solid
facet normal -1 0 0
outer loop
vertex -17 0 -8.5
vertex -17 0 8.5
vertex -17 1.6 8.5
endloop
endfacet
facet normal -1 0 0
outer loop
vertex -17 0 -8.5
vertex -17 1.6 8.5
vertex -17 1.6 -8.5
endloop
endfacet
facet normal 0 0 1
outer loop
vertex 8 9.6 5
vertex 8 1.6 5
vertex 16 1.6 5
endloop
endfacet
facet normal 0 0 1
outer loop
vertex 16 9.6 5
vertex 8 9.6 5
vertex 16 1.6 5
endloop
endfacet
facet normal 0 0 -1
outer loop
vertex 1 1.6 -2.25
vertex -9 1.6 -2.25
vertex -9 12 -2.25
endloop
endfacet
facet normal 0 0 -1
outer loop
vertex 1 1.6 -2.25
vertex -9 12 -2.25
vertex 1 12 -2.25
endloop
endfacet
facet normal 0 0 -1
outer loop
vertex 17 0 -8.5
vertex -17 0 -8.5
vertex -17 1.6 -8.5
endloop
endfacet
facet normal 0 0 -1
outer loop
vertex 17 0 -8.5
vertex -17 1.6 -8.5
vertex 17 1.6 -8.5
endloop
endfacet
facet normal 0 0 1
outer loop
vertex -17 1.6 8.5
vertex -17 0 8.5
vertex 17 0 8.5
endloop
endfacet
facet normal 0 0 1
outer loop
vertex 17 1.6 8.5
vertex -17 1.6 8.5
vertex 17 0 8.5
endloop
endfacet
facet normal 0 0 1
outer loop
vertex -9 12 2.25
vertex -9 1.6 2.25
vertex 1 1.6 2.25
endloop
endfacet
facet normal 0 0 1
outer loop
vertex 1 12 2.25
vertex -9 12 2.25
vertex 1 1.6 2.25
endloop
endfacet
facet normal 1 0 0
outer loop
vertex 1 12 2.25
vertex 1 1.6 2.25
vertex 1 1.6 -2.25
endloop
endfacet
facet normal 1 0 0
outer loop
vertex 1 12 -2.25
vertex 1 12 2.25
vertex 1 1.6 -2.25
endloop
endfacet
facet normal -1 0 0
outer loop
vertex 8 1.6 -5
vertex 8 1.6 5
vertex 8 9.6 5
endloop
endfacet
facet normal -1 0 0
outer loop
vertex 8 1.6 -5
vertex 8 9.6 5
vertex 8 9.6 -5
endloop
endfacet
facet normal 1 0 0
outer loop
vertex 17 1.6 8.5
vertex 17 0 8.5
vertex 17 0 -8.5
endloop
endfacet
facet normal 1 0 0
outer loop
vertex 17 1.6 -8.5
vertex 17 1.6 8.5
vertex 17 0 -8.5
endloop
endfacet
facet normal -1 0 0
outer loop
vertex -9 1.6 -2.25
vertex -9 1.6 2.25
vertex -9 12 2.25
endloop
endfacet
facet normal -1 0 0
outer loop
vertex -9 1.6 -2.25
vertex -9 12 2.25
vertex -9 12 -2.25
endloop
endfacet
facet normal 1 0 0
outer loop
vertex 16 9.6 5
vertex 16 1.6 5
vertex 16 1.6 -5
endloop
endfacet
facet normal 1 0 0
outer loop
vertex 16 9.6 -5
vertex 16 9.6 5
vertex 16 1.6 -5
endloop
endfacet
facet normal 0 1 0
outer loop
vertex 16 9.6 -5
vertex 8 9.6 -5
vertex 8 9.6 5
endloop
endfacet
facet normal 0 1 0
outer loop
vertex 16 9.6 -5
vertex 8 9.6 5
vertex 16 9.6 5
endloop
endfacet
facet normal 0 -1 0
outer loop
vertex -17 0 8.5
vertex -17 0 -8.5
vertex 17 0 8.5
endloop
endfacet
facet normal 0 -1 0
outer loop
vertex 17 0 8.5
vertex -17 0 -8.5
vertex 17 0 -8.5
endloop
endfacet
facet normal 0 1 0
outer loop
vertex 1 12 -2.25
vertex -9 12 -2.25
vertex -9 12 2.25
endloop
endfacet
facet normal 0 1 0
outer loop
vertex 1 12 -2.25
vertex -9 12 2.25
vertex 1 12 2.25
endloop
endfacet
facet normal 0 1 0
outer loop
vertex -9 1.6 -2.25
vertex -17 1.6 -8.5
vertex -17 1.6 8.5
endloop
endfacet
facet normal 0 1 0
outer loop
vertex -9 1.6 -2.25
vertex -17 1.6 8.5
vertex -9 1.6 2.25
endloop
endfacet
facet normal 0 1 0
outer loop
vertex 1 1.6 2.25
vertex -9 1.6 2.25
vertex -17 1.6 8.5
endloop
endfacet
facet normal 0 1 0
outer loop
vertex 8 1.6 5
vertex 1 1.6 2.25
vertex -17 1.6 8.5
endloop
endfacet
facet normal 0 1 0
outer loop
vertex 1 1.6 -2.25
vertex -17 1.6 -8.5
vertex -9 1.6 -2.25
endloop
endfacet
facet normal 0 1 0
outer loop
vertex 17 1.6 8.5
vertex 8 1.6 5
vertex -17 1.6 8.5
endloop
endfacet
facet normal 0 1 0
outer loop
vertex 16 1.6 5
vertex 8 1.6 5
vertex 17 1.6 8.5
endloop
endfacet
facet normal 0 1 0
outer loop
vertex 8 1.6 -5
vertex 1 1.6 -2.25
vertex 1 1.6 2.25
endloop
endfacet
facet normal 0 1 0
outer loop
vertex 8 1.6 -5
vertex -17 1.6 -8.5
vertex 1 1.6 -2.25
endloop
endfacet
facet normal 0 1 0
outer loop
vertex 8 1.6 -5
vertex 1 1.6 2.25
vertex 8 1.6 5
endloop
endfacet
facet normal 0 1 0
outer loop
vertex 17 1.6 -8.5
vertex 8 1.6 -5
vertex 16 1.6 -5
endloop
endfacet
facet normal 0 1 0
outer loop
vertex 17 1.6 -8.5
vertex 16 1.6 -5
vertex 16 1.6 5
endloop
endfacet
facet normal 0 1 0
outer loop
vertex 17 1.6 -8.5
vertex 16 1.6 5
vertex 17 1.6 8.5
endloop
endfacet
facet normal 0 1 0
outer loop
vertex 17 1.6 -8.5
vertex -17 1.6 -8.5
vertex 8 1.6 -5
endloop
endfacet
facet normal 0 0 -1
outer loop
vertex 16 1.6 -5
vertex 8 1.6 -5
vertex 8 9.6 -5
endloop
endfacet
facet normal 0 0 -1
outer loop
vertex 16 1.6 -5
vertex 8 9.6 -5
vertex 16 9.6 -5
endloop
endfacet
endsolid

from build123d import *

# Parameters (mm, degrees)
SKETCH1_W            = 34
SKETCH1_H            = 17
BOARD_DEPTH          = 1.6
TO220_START          = 1.6
SKETCH2_W            = 10
SKETCH2_H            = 4.5
TO220_DEPTH          = 10.4
TERMINAL_BLOCK_START = 1.6
SKETCH3_W            = 8
SKETCH3_H            = 10
TERMINAL_BLOCK_DEPTH = 8


with BuildPart() as part:
    # Sketch1 → Board (new body)
    with BuildSketch(Plane(origin=(0, 0, 0), x_dir=(1, 0, 0), z_dir=(0, 1, 0))):
        Rectangle(SKETCH1_W, SKETCH1_H)
    extrude(amount=BOARD_DEPTH)

    # Sketch2 → TO220 (add)
    with BuildSketch(Plane(origin=(0, 0, 0), x_dir=(1, 0, 0), z_dir=(0, 1, 0)).offset(TO220_START)):
        with Locations((-4, 0)):
            Rectangle(SKETCH2_W, SKETCH2_H)
    extrude(amount=TO220_DEPTH)

    # Sketch3 → Terminal_Block (add)
    with BuildSketch(Plane(origin=(0, 0, 0), x_dir=(1, 0, 0), z_dir=(0, 1, 0)).offset(TERMINAL_BLOCK_START)):
        with Locations((12, 0)):
            Rectangle(SKETCH3_W, SKETCH3_H)
    extrude(amount=TERMINAL_BLOCK_DEPTH)


solid = part.part
